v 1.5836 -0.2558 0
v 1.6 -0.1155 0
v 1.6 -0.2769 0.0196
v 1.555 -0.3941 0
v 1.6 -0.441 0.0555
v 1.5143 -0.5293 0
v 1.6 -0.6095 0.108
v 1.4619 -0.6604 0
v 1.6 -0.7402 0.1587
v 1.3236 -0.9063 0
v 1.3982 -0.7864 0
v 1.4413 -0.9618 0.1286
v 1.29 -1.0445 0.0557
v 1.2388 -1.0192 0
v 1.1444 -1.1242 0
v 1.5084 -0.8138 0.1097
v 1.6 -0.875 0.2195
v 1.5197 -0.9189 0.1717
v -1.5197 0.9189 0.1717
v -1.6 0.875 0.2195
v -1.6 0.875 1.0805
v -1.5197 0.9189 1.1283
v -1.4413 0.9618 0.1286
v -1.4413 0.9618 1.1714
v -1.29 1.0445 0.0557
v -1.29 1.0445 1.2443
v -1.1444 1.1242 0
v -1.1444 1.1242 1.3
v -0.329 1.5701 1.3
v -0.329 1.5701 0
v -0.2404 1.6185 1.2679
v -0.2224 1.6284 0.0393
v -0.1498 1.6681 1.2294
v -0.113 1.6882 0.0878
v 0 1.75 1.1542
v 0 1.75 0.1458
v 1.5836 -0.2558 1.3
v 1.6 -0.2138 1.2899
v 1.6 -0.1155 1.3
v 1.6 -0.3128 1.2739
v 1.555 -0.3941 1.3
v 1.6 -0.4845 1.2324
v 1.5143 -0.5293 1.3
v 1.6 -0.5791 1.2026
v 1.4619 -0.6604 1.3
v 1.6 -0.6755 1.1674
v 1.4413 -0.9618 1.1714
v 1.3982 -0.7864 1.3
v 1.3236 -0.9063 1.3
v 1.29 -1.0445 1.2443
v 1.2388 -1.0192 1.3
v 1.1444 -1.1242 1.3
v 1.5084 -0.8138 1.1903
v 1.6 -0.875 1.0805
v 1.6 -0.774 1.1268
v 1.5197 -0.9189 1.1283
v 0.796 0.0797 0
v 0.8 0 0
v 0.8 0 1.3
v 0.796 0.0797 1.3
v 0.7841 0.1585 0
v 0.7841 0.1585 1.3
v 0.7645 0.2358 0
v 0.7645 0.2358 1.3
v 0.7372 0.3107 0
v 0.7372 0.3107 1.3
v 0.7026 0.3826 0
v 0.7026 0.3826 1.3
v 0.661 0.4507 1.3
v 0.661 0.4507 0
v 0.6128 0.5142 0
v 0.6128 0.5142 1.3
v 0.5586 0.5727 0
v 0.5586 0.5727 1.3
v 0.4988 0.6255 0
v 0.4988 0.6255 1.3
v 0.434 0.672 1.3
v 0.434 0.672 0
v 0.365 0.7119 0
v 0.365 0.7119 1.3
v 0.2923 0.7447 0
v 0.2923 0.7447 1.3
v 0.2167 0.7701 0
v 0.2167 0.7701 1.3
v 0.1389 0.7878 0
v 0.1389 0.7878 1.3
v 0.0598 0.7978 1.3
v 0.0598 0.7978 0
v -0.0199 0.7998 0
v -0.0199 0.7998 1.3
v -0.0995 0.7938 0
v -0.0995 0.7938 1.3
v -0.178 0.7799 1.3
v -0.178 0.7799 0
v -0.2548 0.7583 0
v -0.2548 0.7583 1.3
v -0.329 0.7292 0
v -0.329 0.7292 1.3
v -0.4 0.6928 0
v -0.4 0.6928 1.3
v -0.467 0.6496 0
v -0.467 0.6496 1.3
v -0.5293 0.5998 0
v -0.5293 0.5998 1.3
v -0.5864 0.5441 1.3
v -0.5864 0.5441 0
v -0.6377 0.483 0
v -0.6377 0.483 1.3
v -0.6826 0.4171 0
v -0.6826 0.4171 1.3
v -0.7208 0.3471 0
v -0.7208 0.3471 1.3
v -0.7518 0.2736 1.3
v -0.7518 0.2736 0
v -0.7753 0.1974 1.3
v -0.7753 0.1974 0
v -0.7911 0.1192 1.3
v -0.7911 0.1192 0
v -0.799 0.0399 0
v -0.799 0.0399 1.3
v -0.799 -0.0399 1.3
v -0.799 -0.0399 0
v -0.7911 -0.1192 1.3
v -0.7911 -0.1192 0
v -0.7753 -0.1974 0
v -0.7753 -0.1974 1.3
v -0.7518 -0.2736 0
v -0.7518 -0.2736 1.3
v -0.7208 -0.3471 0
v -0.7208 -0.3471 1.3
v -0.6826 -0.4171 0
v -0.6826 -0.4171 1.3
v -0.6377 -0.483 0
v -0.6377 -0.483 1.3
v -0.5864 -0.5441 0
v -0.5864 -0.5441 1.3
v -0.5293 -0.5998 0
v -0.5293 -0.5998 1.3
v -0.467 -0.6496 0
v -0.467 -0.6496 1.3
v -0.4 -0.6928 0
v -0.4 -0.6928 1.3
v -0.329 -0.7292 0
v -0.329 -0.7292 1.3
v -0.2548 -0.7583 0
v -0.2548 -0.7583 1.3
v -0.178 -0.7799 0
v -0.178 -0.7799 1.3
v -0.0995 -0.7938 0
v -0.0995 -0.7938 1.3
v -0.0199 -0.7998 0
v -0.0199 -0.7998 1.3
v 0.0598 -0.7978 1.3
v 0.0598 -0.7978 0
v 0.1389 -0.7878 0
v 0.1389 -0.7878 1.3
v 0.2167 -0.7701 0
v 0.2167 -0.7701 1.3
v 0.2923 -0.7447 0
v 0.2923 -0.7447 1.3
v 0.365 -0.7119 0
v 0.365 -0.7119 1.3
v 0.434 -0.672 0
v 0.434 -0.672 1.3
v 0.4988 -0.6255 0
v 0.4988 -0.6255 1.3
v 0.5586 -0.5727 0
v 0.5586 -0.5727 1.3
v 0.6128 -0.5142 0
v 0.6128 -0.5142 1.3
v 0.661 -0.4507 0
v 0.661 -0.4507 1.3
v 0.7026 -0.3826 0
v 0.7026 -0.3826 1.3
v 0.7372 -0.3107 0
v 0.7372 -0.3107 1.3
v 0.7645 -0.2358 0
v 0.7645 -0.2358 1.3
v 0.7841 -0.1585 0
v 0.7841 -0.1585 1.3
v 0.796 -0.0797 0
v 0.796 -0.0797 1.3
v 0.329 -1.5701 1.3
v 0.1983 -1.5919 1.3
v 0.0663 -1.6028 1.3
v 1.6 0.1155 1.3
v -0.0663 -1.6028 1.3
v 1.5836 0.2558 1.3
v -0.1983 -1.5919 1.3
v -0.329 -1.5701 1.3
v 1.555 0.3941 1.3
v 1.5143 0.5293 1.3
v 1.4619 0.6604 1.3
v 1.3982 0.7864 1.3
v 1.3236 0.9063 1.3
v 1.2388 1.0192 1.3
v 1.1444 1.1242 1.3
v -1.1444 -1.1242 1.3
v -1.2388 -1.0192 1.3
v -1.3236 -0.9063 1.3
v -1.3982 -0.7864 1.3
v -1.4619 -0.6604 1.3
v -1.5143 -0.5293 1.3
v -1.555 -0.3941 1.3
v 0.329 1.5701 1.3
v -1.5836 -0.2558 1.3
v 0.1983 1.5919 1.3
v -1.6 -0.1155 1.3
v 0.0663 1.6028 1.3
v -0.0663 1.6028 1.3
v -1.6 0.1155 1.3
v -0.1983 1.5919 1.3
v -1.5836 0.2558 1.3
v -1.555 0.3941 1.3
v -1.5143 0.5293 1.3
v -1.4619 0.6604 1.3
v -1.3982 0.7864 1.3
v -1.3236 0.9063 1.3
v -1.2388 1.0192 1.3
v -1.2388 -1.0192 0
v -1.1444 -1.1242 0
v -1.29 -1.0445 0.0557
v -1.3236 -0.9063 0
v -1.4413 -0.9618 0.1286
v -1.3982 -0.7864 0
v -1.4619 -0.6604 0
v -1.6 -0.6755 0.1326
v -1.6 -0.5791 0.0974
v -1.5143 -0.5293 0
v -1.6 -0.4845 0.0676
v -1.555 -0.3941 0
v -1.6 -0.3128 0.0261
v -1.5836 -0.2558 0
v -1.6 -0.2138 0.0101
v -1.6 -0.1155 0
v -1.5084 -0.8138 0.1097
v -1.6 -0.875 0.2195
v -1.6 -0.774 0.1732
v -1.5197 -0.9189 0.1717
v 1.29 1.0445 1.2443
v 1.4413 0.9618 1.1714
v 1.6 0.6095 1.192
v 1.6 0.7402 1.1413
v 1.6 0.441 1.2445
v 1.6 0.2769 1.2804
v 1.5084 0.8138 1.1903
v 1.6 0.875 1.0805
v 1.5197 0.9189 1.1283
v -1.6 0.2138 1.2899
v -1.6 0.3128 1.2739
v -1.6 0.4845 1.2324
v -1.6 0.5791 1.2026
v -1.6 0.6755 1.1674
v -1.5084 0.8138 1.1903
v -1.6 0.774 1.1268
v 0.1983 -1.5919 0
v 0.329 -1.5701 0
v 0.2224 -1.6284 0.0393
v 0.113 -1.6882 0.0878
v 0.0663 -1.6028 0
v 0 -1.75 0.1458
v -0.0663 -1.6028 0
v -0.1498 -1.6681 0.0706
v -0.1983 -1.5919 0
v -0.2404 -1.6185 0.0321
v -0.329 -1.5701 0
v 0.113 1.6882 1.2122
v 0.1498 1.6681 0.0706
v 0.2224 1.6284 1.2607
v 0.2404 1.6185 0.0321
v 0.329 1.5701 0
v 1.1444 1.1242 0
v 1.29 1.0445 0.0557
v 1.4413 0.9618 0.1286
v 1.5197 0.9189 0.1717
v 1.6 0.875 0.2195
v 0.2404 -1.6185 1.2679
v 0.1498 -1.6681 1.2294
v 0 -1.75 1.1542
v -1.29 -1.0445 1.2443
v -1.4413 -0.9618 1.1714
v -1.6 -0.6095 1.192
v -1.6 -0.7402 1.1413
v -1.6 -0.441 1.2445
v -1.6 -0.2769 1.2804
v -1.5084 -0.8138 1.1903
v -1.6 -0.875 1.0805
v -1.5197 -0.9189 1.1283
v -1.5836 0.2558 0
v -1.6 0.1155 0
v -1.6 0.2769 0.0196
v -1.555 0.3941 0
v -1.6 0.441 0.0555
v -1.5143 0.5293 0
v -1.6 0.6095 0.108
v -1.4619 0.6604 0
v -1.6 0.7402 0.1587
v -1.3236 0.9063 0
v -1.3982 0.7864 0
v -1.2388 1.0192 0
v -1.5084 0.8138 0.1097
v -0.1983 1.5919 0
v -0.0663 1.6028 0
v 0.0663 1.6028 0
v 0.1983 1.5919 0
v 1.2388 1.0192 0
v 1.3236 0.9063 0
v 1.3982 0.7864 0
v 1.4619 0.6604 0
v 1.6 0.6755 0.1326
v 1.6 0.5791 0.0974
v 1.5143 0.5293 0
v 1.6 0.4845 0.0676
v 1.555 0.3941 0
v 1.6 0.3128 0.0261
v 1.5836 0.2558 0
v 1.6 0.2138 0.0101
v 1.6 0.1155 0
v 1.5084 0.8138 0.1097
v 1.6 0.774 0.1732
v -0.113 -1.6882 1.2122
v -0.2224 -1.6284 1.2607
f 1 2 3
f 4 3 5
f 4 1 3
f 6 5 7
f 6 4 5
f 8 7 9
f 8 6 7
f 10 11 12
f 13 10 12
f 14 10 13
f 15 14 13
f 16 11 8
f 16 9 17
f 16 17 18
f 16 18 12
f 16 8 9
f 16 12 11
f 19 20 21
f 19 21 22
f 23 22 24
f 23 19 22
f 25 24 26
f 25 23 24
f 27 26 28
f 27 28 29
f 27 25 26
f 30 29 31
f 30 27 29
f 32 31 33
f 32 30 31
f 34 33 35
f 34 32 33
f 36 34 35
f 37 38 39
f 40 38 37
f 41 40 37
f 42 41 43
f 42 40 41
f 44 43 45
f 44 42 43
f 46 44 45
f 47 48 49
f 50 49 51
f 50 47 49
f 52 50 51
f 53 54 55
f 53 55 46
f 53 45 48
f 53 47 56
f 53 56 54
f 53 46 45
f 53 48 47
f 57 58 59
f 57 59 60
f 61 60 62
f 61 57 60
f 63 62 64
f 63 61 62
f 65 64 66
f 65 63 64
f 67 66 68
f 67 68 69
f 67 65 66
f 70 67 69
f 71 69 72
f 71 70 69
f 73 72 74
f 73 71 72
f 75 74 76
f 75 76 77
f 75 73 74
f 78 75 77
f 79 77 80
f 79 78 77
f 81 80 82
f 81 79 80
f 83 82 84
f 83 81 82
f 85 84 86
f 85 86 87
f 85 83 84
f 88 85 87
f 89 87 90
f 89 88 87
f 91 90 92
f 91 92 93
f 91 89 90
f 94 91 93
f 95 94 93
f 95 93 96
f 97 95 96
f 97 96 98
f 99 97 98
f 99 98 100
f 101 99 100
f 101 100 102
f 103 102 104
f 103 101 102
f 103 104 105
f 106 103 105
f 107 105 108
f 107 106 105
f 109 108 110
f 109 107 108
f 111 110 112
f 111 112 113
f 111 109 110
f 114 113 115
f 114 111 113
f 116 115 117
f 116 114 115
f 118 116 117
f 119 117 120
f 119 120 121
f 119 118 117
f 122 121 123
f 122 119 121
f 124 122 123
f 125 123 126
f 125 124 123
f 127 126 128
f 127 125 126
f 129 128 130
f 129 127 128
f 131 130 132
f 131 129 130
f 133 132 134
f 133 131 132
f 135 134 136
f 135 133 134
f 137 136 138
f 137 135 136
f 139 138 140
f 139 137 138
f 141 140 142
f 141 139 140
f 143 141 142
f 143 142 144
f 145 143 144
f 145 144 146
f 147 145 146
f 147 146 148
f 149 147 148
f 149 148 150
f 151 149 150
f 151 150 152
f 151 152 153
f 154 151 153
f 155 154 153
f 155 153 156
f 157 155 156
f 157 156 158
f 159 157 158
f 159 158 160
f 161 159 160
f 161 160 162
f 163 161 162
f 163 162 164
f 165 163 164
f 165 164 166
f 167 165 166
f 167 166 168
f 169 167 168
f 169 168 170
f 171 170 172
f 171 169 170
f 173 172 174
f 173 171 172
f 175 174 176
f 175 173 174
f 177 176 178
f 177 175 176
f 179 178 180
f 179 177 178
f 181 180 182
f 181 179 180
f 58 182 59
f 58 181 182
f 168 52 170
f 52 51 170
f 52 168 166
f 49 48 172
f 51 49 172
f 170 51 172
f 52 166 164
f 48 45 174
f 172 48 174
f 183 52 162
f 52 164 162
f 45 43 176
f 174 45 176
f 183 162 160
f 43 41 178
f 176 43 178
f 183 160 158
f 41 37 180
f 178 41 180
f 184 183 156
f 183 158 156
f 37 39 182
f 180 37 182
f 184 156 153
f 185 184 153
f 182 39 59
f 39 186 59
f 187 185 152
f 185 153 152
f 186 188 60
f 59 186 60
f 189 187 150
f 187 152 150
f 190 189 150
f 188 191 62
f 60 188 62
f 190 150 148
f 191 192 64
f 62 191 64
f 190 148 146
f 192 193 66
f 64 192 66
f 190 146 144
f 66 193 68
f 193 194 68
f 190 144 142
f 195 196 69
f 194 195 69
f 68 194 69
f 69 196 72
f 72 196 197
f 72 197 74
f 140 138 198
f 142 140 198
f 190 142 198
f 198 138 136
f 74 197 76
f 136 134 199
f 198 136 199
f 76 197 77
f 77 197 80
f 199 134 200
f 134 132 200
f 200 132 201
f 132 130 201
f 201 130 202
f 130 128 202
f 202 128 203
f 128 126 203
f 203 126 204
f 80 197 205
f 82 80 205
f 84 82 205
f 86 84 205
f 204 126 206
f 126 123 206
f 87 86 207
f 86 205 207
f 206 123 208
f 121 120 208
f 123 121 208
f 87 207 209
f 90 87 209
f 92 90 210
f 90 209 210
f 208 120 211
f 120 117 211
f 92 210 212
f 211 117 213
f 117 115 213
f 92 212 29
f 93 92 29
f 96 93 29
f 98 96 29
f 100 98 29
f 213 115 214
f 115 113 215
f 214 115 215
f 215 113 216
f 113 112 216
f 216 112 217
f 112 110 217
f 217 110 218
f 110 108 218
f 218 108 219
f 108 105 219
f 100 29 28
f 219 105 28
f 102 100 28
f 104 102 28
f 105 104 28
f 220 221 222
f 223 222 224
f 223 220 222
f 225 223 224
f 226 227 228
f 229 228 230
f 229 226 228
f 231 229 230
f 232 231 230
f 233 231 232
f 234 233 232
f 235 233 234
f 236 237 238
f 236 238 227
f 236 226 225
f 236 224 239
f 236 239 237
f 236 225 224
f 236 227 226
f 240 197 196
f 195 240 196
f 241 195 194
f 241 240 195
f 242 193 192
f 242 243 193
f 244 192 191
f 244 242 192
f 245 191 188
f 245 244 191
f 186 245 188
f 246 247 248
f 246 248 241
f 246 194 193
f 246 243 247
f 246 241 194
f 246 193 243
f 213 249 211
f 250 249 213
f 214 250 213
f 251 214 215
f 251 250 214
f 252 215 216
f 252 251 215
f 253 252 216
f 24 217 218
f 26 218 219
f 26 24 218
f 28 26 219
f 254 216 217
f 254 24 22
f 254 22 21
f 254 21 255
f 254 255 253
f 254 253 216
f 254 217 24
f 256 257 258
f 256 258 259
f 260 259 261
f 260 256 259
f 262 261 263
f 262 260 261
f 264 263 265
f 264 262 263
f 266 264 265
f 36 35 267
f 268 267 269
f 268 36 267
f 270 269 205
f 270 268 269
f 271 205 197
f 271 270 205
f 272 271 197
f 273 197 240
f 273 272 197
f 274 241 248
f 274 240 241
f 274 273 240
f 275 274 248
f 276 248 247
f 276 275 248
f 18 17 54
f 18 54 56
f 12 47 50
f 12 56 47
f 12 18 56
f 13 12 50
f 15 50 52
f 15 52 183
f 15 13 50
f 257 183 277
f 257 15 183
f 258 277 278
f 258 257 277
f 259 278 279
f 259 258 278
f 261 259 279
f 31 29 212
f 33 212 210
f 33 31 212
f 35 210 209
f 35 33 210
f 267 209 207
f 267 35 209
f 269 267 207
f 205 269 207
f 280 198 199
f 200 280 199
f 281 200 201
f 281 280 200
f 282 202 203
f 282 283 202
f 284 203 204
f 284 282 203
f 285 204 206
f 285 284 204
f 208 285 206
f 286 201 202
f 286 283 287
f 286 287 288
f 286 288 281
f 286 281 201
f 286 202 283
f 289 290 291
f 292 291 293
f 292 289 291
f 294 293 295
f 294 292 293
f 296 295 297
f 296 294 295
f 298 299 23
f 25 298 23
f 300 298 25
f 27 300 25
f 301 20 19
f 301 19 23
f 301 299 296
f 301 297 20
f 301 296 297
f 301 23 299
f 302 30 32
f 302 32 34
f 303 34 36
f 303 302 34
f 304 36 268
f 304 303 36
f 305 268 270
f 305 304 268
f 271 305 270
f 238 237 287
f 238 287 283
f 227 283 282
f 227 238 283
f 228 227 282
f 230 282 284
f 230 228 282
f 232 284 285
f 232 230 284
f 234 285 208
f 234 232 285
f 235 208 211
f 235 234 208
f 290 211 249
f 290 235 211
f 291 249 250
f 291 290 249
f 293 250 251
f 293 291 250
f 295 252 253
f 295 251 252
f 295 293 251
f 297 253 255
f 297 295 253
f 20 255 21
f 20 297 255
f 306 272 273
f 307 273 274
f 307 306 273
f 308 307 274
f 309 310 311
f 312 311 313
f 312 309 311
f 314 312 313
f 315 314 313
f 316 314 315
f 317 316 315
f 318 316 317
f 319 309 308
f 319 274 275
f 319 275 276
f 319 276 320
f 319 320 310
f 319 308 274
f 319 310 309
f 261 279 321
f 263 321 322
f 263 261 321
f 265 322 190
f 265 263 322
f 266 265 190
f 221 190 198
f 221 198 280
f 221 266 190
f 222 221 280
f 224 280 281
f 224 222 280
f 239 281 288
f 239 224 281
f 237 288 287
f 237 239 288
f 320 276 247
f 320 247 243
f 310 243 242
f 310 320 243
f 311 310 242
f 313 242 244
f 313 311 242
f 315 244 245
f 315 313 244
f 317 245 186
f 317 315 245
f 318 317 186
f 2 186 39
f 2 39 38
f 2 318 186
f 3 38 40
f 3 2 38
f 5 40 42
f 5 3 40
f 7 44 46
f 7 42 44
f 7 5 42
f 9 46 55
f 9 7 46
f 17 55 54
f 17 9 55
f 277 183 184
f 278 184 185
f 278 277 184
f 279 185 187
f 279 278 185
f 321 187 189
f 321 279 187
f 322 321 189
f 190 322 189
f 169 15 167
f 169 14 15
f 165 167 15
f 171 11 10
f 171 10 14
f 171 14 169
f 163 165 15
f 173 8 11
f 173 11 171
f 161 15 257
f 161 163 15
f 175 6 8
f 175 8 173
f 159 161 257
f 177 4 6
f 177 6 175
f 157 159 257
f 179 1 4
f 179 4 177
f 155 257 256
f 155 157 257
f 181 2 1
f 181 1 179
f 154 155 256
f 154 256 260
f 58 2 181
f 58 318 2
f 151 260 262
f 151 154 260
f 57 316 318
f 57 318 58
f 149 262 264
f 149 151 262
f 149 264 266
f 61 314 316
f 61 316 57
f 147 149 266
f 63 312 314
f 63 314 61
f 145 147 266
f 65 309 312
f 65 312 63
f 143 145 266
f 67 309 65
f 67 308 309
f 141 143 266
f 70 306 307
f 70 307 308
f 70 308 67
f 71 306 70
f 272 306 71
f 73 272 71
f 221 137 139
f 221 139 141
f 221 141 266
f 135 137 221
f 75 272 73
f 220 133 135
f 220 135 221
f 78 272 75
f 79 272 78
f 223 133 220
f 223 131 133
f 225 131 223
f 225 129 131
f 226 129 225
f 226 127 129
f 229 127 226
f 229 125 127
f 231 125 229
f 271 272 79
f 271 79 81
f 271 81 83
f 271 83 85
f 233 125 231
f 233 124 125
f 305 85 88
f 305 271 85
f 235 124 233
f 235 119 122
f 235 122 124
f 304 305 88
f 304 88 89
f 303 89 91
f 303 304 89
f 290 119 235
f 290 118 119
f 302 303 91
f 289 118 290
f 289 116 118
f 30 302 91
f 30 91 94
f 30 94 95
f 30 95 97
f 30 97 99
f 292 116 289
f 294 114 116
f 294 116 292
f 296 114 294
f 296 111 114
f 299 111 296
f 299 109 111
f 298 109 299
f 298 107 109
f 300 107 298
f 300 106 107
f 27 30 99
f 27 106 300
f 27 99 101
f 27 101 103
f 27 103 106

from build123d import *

# Parameters (mm, degrees)
SKETCH1_R = 0.8
NUT_DEPTH = 1.3


with BuildPart() as part:
    # Sketch1 → NUT (new body)
    with BuildSketch(Plane.XY):
        Polygon((-1.6, -0.875), (-1.6, 0.875), (0, 1.75), (1.6, 0.875), (1.6, -0.875), (0, -1.75), align=None)
        Circle(SKETCH1_R, mode=Mode.SUBTRACT)
    extrude(amount=NUT_DEPTH)

    # Sketch2 → Cut-Revolve1 (revolve, cut)
    with BuildSketch(Plane(origin=(0, 0, 0), x_dir=(0, 0, -1), z_dir=(1, 0, 0))):
        Polygon((-1.3, 1.604166667), (-0.666550175, 2.237616491), (-1.3, 2.237616491), (-1.3, 1.75), align=None)
        Polygon((0, 2.237616491), (-0.633449825, 2.237616491), (0, 1.604166667), (0, 1.75), align=None)
    revolve(axis=Axis((0, 0, 1.3), (0, 0, -1)), mode=Mode.SUBTRACT)


solid = part.part
